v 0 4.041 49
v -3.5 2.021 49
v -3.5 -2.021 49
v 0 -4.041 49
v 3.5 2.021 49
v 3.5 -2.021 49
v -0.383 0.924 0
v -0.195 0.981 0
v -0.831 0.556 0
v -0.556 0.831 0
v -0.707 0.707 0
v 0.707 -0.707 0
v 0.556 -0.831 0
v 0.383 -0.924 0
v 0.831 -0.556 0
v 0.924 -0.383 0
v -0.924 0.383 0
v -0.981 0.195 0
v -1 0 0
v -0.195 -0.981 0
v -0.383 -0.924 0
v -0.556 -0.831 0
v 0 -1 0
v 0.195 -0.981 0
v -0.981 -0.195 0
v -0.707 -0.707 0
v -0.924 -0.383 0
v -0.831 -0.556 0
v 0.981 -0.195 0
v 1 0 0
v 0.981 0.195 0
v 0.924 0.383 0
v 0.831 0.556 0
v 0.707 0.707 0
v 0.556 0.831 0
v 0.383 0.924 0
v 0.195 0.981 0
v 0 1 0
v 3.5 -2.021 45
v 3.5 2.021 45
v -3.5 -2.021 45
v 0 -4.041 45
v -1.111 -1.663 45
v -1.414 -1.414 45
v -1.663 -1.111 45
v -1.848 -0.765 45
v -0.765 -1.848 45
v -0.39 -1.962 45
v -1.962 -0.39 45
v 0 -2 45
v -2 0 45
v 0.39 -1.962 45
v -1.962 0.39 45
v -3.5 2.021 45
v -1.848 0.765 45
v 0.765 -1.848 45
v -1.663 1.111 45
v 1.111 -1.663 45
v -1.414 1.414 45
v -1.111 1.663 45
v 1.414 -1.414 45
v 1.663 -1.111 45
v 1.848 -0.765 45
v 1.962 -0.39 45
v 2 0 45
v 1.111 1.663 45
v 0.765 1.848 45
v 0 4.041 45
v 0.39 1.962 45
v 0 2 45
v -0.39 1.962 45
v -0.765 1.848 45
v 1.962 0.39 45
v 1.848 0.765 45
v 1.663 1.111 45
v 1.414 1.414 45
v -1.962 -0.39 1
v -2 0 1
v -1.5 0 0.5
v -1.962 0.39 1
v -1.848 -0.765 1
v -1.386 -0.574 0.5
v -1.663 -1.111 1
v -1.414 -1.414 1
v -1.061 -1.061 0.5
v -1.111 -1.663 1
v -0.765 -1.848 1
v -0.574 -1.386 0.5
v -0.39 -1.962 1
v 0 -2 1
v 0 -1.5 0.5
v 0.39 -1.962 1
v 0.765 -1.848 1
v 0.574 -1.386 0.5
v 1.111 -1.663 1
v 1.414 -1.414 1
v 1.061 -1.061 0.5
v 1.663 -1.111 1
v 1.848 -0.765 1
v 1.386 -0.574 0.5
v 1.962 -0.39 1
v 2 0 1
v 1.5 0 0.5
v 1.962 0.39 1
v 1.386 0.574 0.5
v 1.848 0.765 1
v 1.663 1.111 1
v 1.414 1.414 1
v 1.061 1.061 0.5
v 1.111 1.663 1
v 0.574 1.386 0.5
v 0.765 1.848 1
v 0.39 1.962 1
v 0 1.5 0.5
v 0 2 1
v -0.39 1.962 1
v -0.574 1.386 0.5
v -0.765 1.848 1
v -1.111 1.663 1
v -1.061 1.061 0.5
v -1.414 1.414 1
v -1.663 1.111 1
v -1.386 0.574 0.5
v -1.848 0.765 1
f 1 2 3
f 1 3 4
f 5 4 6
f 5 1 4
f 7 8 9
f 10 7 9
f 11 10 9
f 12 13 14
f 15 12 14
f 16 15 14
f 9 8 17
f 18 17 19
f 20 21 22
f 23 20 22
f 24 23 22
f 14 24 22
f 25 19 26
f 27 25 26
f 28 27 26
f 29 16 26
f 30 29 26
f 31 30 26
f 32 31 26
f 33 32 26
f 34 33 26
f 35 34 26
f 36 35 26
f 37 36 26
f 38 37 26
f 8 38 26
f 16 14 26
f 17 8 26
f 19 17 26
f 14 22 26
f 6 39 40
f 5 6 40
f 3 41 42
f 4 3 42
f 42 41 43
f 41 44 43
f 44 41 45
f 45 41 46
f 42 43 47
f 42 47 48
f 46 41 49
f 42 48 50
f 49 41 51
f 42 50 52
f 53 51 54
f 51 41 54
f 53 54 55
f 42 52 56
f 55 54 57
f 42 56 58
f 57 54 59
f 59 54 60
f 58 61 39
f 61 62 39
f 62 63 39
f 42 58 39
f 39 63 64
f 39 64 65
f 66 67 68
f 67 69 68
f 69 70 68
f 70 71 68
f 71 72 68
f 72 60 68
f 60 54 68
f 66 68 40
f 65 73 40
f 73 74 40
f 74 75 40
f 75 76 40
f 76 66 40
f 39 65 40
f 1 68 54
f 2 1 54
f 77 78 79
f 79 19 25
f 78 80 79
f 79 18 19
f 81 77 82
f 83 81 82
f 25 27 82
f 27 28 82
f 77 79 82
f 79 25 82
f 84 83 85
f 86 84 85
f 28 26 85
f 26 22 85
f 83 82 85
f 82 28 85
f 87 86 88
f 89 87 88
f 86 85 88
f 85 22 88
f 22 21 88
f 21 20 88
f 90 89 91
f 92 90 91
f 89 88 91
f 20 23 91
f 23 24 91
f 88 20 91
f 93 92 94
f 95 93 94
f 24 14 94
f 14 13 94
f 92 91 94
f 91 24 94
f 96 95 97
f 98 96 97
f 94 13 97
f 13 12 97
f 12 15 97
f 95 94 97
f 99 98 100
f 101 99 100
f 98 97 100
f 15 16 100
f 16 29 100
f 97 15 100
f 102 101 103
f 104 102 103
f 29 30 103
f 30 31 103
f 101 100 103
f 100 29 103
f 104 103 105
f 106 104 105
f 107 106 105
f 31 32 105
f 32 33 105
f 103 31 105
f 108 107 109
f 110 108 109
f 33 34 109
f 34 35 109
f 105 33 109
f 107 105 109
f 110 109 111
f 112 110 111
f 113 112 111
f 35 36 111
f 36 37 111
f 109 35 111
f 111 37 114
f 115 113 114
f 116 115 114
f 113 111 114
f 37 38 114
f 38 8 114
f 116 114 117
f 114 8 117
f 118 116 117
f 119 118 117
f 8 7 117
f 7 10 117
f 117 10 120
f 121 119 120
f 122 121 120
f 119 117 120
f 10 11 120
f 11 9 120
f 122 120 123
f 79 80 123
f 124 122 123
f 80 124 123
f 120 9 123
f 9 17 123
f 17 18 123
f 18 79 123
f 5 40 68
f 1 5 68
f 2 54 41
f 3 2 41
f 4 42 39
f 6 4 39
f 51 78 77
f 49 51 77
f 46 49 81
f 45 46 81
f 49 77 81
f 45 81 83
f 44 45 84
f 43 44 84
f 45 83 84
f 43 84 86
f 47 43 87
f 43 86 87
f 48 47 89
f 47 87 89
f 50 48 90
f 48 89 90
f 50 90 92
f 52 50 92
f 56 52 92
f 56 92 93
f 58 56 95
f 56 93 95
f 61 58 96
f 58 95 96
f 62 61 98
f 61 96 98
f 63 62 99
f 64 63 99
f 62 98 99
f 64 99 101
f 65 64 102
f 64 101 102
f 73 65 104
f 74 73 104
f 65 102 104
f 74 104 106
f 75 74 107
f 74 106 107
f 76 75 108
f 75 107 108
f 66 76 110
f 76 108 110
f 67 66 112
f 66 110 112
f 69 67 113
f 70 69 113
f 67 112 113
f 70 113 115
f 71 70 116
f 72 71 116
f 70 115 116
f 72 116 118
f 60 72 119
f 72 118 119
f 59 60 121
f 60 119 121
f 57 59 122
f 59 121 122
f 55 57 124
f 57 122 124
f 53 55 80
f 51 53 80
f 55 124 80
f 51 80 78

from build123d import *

# Parameters (mm, degrees)
SKETCH1_R         = 2
EXTRUDE_311_DEPTH = 45
EXTRUDE_445_DEPTH = 4
CHAMFER1_SIZE     = 1


with BuildPart() as part:
    # Sketch1 → Extrude 311 (new body)
    with BuildSketch(Plane.XY):
        with Locations(Location((0, 0, 0), (0, 0, 180))):
            Circle(SKETCH1_R)
    extrude(amount=EXTRUDE_311_DEPTH)

    # Sketch2 → Extrude 445 (add)
    with BuildSketch(Plane.XY.offset(45)):
        Polygon((0, 4.041451884), (-3.5, 2.020725942), (-3.5, -2.020725942), (0, -4.041451884), (3.5, -2.020725942), (3.5, 2.020725942), align=None)
    extrude(amount=EXTRUDE_445_DEPTH)

    # Chamfer1
    chamfer1_edges = [part.edges().sort_by_distance(p)[0] for p in [
        (2, 0, 0),
    ]]
    chamfer(chamfer1_edges, length=CHAMFER1_SIZE)


solid = part.part
